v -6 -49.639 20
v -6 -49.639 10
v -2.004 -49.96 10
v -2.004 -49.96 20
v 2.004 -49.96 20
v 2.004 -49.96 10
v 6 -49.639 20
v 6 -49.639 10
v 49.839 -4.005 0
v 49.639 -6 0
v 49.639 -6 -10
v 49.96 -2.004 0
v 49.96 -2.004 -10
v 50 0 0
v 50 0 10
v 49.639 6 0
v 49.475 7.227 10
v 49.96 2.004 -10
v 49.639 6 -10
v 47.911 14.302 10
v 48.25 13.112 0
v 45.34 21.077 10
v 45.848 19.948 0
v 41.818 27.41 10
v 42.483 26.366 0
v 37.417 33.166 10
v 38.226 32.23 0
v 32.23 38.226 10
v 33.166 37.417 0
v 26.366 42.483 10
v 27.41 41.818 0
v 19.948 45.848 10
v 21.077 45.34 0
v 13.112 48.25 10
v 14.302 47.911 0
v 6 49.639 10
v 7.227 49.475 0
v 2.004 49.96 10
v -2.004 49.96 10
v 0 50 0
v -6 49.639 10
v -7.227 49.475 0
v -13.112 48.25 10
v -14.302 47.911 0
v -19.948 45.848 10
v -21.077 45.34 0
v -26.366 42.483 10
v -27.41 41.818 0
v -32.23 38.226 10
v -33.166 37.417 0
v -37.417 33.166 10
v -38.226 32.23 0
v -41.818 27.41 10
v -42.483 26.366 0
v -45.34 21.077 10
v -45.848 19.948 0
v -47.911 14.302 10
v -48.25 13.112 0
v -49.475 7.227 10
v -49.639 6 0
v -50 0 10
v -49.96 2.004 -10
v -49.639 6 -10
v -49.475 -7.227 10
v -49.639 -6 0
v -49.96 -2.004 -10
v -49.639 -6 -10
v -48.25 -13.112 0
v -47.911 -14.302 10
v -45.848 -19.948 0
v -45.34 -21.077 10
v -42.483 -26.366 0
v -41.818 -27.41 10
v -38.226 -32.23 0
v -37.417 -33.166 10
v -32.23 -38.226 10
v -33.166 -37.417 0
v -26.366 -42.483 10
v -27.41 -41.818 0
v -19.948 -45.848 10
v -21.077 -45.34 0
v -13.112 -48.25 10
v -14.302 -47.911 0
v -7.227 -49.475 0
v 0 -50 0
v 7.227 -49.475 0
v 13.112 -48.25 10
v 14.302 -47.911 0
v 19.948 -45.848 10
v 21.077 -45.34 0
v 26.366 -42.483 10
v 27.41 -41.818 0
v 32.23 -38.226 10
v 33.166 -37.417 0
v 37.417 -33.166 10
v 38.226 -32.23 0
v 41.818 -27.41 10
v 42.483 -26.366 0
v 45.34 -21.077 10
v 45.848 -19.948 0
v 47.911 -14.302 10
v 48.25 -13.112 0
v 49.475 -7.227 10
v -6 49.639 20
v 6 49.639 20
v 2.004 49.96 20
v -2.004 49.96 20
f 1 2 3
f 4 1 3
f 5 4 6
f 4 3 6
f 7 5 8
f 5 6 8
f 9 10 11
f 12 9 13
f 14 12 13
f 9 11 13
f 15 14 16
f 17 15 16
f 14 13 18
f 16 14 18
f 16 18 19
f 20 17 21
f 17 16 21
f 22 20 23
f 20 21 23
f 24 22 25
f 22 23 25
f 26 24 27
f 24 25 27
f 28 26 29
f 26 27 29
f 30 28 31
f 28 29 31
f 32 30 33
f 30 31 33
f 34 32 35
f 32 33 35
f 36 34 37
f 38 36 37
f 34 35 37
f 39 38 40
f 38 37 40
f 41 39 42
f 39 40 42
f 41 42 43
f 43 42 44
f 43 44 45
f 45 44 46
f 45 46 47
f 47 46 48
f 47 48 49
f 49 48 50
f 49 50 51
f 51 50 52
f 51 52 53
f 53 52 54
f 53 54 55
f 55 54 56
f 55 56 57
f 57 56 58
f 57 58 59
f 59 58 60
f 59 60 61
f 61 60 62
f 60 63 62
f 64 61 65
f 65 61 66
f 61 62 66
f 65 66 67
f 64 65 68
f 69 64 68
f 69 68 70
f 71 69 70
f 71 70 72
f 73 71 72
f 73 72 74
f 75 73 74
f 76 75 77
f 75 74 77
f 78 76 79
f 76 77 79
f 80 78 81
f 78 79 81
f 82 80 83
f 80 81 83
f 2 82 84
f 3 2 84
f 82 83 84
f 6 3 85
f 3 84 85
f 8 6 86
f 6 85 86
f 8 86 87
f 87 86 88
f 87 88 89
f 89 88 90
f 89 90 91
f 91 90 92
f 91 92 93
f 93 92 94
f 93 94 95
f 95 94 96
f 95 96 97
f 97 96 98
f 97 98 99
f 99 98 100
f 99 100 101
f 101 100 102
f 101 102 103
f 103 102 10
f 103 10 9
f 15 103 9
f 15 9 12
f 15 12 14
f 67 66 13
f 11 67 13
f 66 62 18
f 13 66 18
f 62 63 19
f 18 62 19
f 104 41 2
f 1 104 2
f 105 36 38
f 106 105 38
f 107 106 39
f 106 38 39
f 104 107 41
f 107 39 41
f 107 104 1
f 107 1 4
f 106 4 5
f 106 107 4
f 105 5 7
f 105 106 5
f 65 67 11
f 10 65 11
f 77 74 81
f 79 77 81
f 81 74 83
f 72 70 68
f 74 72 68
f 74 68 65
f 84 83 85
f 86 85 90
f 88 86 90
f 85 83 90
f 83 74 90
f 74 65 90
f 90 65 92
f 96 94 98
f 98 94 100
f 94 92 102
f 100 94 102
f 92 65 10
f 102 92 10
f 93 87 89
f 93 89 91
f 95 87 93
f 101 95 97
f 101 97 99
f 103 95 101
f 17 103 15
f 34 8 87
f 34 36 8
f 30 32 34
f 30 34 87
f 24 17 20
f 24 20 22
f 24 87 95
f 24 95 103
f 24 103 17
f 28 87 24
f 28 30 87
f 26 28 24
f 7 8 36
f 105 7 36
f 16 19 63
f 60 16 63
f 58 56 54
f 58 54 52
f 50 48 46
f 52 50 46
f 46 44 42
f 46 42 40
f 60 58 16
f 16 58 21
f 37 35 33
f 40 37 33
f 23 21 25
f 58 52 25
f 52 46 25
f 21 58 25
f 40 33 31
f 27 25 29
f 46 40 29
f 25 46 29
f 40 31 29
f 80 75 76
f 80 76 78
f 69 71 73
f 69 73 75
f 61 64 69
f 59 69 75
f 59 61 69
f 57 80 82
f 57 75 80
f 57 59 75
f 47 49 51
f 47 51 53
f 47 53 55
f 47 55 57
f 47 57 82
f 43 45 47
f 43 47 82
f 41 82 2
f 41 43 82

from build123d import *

# Parameters (mm, degrees)
SKETCH2_R           = 50
BOSS_EXTRUDE1_DEPTH = 10
BOSS_EXTRUDE2_START = 10
BOSS_EXTRUDE2_DEPTH = 10
BOSS_EXTRUDE3_DEPTH = 10


with BuildPart() as part:
    # Sketch2 → Boss-Extrude1 (new body)
    with BuildSketch(Plane.XY):
        Circle(SKETCH2_R)
    extrude(amount=BOSS_EXTRUDE1_DEPTH)

    # Sketch3 → Boss-Extrude2 (add)
    with BuildSketch(Plane(origin=(0, 0, 0), x_dir=(-1, 0, 0), z_dir=(0, 0, -1)).offset(BOSS_EXTRUDE2_START)):
        with BuildLine():
            Line((-49.638694584, 6), (49.638694584, 6))
            ThreePointArc((49.638694584, 6), (50, 0), (49.638694584, -6))
            Line((49.638694584, -6), (-49.638694584, -6))
            ThreePointArc((-49.638694584, -6), (-50, 0), (-49.638694584, 6))
        make_face()
    extrude(amount=-BOSS_EXTRUDE2_DEPTH)

    # Sketch5 → Boss-Extrude3 (add)
    with BuildSketch(Plane.XY.offset(10)):
        with BuildLine():
            Line((-6, 49.638694584), (-6, -49.638694584))
            ThreePointArc((-6, -49.638694584), (0, -50), (6, -49.638694584))
            Line((6, -49.638694584), (6, 49.638694584))
            ThreePointArc((6, 49.638694584), (0, 50), (-6, 49.638694584))
        make_face()
    extrude(amount=BOSS_EXTRUDE3_DEPTH)


solid = part.part
